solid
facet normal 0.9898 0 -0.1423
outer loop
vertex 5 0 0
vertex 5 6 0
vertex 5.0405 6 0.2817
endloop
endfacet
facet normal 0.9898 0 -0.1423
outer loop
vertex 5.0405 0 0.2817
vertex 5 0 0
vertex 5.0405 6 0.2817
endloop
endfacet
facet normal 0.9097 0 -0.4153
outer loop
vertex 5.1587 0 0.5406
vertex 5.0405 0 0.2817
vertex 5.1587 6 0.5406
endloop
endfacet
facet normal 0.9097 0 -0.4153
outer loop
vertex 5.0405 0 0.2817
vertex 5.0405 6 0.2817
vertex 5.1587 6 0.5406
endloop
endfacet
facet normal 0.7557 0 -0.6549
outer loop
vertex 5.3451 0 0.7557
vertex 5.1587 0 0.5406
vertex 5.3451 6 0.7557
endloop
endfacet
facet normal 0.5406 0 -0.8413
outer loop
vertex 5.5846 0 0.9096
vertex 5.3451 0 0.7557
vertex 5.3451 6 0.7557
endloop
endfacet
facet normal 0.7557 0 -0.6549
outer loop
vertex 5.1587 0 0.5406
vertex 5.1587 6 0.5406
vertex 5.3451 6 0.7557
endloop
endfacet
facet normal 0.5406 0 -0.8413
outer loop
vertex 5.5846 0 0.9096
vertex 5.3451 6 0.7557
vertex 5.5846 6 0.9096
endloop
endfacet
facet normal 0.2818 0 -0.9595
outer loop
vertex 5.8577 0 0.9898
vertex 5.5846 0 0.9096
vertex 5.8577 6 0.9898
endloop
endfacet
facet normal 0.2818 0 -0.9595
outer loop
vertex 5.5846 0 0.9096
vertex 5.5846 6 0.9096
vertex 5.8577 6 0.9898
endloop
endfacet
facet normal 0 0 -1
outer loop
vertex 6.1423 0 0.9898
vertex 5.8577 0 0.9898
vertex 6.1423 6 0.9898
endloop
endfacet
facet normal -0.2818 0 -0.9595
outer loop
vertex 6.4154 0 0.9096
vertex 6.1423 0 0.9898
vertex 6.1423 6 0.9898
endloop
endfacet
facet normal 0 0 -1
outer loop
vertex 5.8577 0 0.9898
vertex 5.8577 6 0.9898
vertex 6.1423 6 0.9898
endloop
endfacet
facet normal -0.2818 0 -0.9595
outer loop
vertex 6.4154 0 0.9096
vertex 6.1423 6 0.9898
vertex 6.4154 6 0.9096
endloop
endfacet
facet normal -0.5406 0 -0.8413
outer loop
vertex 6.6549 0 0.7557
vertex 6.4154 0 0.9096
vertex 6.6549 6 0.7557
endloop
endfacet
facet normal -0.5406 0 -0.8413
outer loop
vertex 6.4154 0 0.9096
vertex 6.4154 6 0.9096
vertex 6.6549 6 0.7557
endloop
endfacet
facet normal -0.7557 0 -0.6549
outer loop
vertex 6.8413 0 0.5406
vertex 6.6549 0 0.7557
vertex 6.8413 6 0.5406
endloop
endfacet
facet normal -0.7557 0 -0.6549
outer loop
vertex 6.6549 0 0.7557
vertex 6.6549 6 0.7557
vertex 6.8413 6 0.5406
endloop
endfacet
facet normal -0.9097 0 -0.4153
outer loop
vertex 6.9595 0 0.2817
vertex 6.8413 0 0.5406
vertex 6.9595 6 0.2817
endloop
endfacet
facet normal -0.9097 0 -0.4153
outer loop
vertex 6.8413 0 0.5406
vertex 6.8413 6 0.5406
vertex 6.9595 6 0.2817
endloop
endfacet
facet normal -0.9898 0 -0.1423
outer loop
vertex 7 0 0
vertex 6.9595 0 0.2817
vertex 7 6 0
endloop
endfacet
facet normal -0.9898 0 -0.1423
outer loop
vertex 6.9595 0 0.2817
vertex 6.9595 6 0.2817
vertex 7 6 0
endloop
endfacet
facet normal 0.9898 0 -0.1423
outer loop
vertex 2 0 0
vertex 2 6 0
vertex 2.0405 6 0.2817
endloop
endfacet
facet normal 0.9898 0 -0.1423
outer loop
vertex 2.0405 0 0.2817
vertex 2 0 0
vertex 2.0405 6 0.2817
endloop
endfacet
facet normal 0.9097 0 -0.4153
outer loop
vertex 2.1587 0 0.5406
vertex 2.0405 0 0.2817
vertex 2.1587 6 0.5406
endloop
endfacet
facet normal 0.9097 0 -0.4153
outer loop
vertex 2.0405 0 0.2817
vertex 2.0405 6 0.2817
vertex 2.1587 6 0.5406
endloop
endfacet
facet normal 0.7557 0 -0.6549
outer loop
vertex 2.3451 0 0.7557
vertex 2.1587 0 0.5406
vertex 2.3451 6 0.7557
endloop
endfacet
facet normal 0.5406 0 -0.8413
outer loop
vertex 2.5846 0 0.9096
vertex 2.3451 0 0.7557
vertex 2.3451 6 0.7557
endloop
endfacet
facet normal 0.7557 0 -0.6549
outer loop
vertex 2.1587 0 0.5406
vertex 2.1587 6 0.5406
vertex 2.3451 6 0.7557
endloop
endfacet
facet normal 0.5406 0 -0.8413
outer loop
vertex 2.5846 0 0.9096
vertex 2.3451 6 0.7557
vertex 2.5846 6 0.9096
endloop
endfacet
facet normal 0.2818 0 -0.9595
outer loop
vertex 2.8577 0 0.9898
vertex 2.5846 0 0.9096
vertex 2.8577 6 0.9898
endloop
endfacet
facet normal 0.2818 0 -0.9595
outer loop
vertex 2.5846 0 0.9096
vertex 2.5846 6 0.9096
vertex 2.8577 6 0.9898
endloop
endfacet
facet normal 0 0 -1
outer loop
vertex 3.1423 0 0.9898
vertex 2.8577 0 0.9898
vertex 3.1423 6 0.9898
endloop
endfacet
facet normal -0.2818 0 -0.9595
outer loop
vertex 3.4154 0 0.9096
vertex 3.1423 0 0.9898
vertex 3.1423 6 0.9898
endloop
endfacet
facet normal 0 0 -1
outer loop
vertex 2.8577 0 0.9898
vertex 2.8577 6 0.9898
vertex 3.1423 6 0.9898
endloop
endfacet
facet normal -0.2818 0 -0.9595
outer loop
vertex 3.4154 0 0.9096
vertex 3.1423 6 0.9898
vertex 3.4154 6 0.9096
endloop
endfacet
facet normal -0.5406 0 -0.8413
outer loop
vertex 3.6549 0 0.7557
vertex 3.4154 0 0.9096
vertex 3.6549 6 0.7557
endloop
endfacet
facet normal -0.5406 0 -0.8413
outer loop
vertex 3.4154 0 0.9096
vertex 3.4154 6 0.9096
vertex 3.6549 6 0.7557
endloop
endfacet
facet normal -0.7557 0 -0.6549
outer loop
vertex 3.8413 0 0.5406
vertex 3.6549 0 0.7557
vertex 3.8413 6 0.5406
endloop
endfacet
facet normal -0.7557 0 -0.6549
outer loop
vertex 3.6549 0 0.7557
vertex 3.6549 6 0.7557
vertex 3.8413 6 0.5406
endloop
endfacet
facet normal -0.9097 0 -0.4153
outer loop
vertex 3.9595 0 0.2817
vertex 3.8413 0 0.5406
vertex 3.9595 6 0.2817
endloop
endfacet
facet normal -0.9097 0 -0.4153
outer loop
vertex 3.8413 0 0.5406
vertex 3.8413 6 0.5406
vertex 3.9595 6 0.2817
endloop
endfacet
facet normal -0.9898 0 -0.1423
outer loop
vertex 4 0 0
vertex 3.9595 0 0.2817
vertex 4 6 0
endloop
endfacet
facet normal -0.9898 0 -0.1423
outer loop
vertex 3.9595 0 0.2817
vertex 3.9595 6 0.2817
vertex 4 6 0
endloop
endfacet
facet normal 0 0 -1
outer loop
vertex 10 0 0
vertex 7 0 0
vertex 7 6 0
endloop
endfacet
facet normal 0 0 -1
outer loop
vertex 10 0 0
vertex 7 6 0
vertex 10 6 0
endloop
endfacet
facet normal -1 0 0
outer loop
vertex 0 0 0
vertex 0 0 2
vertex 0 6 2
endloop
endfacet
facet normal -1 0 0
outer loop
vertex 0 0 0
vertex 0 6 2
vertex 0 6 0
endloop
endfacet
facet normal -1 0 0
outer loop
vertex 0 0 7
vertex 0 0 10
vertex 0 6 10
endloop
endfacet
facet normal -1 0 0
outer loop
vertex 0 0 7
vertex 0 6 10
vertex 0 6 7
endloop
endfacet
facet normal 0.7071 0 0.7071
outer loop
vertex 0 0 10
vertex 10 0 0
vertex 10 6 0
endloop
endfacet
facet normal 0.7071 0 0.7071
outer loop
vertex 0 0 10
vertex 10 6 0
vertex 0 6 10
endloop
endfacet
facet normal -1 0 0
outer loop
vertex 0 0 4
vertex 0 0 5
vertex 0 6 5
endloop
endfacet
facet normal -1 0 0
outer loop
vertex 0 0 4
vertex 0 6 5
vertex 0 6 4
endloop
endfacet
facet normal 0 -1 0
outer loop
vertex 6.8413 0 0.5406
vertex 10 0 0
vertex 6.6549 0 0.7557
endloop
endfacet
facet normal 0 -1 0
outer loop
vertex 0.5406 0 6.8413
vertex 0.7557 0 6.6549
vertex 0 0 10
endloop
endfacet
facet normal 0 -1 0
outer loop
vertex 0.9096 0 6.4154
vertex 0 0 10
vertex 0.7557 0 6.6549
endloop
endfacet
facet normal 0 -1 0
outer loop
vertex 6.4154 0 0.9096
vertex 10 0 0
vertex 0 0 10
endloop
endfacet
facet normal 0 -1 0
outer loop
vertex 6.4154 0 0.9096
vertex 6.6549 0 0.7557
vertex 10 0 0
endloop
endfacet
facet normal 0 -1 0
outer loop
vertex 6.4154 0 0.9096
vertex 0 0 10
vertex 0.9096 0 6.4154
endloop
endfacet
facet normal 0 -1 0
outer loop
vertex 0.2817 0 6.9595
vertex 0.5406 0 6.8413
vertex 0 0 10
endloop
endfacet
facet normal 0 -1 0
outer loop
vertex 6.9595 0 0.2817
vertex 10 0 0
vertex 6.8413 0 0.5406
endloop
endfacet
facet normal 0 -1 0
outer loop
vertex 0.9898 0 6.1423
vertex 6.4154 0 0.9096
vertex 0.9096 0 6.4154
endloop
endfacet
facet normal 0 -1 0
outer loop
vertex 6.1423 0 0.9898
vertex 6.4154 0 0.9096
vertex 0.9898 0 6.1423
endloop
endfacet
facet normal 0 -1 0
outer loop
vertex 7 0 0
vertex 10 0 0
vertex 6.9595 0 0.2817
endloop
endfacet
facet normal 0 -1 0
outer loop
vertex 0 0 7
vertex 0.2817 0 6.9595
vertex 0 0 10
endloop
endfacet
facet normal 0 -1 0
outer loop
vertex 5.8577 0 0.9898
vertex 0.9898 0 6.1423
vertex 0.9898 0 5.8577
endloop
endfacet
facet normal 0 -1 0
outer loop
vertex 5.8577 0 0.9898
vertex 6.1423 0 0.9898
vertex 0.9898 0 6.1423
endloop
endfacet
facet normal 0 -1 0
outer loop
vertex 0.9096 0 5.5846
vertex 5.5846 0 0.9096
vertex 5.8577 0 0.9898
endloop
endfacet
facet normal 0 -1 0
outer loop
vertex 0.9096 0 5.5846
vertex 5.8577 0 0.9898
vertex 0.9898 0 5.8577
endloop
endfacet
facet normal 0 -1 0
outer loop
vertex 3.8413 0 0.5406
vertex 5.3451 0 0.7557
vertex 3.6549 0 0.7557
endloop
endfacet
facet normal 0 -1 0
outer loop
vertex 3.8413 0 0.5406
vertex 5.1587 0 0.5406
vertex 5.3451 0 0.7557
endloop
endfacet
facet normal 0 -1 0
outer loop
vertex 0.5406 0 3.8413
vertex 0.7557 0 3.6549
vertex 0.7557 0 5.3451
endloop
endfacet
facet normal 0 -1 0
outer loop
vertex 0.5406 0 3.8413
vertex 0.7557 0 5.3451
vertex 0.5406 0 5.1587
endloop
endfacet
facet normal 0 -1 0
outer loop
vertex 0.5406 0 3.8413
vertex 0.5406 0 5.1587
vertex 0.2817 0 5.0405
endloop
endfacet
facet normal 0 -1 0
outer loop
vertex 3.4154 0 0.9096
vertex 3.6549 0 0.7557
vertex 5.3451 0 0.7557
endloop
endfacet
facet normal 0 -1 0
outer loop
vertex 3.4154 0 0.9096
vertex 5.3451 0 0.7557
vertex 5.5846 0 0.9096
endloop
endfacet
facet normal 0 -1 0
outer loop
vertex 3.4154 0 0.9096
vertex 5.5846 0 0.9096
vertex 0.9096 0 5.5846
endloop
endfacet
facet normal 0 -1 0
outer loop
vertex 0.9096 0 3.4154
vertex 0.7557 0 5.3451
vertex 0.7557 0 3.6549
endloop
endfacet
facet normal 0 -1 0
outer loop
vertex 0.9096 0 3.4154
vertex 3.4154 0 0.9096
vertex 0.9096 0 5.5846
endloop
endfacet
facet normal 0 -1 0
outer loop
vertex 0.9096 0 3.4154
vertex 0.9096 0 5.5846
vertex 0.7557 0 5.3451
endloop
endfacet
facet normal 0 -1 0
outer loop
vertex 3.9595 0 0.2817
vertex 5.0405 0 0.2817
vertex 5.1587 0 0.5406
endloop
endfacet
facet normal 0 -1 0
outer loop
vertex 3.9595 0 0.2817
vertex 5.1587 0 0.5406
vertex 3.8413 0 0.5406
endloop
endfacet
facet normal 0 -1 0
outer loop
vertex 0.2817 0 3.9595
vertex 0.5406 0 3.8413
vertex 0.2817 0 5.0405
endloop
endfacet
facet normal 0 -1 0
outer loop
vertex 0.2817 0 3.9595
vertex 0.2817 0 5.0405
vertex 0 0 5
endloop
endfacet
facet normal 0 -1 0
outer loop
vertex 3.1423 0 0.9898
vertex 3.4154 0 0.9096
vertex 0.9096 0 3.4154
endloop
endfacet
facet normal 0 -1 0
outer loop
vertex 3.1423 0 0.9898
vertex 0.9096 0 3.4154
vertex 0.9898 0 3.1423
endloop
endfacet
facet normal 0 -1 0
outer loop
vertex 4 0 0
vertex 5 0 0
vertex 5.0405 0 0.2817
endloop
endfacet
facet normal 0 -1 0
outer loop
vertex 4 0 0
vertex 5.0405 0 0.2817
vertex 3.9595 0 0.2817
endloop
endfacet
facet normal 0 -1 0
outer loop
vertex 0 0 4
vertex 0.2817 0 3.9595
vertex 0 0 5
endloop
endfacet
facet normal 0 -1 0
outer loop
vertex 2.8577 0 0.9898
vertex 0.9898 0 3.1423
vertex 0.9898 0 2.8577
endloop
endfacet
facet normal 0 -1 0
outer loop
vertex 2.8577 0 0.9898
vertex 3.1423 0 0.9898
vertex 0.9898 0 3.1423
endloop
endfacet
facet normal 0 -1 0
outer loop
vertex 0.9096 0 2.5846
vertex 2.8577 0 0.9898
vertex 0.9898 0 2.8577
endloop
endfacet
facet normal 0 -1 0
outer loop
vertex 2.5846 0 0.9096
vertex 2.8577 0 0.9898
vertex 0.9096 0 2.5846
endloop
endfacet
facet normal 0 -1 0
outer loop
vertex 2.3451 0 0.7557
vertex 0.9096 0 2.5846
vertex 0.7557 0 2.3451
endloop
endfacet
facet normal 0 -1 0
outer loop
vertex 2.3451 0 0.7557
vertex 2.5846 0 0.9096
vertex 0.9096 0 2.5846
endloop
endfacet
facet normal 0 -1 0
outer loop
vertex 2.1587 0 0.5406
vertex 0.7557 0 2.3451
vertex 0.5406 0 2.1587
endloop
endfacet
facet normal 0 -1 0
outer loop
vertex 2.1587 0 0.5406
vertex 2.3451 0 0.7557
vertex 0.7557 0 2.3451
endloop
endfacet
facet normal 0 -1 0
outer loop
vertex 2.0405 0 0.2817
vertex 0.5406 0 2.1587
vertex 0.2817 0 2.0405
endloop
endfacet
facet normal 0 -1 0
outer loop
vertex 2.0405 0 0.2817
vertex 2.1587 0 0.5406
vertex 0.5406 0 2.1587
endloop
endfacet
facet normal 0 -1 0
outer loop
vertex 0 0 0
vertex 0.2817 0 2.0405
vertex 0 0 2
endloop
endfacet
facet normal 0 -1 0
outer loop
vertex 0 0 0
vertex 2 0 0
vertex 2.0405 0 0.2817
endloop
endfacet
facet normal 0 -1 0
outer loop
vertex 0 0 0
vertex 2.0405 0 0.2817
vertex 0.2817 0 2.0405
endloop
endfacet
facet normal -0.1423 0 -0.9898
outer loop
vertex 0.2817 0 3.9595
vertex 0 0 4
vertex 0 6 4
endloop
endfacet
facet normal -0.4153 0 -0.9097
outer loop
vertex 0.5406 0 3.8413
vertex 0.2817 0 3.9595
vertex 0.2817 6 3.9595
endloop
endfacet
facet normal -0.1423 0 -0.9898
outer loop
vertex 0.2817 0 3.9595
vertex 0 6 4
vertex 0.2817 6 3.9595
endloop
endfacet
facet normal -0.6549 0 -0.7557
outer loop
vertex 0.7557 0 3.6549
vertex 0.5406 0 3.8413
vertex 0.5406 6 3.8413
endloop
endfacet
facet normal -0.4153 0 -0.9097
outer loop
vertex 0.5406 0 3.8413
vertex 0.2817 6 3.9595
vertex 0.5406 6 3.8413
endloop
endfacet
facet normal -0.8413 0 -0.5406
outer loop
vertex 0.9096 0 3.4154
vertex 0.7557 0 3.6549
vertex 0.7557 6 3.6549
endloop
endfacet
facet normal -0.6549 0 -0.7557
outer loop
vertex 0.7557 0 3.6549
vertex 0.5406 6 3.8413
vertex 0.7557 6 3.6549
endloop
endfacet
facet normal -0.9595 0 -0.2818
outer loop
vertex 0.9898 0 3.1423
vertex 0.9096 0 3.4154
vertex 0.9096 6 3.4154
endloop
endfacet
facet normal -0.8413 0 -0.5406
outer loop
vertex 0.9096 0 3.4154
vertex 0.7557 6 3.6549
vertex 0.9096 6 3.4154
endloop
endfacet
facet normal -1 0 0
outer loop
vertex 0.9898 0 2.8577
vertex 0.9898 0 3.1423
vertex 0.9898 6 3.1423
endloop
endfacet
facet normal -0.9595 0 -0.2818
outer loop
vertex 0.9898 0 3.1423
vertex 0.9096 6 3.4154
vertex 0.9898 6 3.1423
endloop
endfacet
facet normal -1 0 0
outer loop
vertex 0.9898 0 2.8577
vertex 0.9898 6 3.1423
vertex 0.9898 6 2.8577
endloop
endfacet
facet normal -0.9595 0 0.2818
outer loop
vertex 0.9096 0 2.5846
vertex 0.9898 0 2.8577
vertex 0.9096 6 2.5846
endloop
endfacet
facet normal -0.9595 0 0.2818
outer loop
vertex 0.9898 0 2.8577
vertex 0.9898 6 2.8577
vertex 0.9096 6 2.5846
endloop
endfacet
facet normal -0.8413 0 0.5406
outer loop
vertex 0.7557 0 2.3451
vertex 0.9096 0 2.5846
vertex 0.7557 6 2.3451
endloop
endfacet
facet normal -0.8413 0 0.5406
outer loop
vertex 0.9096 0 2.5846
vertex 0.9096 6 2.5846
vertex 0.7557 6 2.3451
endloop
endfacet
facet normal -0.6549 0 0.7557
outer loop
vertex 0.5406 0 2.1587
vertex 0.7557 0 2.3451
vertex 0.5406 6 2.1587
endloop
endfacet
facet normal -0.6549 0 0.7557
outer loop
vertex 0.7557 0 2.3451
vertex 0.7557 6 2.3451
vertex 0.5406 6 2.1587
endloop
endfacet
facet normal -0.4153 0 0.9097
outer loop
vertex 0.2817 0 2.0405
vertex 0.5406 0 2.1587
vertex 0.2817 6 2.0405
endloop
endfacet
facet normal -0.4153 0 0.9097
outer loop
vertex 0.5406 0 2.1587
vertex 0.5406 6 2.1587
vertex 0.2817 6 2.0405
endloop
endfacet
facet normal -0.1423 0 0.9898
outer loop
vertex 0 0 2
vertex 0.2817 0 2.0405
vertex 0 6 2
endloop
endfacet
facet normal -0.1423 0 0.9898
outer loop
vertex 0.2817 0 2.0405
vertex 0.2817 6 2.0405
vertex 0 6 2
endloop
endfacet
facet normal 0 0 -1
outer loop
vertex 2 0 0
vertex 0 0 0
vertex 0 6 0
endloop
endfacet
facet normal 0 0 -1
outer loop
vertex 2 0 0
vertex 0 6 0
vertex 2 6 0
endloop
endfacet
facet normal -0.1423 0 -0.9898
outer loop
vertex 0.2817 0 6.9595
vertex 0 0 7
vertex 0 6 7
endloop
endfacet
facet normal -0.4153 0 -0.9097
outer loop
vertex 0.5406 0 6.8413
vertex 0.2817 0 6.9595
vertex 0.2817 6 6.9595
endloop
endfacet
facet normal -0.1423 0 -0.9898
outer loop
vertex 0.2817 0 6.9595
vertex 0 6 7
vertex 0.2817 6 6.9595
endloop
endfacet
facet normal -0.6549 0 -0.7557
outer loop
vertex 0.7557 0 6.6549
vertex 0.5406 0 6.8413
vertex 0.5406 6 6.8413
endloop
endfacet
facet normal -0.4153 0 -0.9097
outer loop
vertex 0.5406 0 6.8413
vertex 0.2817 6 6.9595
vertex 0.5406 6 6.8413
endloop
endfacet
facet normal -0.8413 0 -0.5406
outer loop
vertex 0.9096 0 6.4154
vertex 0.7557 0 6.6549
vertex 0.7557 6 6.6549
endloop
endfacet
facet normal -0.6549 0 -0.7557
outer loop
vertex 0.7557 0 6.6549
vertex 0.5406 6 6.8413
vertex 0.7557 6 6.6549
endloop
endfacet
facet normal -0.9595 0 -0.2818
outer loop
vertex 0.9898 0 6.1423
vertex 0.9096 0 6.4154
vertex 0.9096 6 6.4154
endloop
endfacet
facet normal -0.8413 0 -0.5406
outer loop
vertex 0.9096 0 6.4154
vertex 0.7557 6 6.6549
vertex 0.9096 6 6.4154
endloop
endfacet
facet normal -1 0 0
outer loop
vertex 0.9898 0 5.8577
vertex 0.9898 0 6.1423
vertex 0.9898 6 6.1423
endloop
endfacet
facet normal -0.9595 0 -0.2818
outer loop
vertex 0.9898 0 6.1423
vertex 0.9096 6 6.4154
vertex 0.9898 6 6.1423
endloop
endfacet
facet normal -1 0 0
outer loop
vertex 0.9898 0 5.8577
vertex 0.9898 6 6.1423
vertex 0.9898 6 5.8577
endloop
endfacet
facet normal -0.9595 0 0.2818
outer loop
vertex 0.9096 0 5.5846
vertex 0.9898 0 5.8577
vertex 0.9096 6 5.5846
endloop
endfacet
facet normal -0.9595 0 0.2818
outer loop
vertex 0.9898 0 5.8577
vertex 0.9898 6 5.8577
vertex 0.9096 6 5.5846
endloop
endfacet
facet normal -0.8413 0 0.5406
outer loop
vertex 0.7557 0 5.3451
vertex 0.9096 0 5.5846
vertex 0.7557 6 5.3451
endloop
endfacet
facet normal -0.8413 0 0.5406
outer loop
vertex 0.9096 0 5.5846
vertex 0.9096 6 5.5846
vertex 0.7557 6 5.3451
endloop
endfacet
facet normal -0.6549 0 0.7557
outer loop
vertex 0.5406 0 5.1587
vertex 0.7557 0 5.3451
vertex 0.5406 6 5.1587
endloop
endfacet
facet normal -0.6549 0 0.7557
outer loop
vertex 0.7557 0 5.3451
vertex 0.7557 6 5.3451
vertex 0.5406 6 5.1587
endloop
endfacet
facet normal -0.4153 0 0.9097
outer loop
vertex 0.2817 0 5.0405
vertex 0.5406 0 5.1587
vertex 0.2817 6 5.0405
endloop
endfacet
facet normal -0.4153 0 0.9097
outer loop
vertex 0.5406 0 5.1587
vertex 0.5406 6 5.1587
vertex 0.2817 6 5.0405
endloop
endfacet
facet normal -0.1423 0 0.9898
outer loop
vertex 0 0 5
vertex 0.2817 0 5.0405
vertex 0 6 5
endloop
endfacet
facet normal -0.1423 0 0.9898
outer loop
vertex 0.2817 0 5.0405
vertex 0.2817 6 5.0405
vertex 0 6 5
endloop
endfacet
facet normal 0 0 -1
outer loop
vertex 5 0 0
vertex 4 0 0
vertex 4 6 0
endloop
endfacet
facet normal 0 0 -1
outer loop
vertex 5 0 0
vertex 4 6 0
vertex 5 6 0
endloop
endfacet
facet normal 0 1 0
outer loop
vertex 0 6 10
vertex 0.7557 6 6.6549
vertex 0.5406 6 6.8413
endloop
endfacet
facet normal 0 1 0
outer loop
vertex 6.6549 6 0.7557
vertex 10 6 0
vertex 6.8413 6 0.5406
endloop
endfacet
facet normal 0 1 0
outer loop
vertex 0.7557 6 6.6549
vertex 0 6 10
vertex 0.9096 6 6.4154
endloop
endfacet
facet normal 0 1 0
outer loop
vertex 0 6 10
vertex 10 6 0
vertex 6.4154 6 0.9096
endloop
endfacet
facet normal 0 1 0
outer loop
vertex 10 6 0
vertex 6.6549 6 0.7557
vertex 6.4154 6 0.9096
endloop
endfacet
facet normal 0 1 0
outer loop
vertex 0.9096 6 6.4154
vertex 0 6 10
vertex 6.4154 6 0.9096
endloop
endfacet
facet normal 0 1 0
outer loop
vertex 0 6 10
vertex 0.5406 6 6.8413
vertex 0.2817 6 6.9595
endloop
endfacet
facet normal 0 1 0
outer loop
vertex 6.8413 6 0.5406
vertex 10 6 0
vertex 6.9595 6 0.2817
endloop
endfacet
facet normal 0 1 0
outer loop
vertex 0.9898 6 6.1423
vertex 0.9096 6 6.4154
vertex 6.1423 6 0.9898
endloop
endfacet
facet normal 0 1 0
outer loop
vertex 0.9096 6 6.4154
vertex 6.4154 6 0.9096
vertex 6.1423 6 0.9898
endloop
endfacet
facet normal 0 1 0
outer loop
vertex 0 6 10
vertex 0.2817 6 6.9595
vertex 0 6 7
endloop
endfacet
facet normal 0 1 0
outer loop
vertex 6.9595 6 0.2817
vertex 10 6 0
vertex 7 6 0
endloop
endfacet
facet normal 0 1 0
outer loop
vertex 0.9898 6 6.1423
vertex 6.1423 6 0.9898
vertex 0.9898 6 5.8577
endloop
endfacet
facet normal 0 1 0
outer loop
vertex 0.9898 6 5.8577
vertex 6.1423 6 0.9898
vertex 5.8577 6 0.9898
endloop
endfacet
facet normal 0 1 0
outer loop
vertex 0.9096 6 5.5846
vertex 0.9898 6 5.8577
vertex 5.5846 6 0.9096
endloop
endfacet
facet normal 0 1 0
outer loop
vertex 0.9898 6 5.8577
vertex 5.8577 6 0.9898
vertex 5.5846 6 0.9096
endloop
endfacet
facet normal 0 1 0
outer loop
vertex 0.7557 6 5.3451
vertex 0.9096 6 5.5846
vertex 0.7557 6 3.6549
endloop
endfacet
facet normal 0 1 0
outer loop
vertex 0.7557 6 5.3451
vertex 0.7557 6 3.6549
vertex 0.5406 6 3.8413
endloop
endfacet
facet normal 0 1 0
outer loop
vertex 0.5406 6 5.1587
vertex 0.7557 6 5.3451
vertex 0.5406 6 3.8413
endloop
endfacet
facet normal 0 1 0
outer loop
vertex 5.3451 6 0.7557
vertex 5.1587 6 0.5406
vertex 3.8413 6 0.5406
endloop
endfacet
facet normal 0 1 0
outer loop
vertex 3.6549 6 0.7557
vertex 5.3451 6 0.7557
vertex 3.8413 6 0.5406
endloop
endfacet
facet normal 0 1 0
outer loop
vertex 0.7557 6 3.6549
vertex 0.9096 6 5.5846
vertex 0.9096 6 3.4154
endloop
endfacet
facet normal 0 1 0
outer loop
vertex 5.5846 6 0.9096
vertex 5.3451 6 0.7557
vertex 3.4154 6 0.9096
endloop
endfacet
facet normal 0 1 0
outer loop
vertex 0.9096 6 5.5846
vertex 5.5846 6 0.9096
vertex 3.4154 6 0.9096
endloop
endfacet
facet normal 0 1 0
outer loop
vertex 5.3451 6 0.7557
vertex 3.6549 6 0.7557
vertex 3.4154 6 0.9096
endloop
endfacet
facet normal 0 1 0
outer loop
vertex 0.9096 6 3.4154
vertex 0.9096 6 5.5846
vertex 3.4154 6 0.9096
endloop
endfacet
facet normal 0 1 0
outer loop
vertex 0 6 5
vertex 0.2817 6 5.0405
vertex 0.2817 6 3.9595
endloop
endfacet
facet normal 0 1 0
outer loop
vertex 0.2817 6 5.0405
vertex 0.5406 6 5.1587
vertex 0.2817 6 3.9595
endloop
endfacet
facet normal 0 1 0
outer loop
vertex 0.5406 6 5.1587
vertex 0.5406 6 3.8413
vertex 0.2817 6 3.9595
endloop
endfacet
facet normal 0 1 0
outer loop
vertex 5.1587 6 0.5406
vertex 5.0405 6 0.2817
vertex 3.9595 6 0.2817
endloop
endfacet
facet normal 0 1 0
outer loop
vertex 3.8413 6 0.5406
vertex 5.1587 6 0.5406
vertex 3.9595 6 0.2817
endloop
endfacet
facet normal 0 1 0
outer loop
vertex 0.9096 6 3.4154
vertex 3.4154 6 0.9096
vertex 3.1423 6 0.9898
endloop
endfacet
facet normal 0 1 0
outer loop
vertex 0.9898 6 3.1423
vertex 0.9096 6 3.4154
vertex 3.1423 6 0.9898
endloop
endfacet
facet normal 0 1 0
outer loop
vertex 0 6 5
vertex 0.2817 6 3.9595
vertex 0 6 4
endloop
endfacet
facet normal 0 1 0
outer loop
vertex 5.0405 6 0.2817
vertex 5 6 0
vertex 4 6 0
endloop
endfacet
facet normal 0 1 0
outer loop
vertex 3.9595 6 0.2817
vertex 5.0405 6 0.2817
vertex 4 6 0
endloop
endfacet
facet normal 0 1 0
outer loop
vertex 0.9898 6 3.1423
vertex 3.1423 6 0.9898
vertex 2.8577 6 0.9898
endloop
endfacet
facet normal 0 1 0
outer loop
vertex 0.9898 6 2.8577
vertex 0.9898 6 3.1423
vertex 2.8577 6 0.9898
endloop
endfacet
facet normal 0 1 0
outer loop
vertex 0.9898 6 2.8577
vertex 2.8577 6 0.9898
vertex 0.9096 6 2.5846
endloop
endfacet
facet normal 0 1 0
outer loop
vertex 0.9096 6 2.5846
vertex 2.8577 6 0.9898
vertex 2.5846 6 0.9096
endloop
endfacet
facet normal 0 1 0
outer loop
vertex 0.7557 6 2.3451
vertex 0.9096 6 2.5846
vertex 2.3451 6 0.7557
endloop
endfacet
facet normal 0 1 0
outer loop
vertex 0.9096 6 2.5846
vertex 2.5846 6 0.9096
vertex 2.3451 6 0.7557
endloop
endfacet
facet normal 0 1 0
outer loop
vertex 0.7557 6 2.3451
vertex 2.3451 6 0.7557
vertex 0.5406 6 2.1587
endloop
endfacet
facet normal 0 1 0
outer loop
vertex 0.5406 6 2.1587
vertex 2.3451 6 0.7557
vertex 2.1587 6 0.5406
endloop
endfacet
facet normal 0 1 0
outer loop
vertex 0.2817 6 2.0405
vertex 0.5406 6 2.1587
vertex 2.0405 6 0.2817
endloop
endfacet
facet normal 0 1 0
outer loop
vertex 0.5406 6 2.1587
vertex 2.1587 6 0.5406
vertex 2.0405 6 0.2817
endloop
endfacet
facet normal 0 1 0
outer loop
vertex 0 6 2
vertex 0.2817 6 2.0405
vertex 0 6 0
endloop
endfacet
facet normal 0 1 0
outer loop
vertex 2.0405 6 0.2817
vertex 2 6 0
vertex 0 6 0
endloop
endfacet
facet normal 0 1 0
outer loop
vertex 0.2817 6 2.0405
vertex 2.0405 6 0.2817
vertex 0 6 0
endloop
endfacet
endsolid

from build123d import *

# Parameters (mm, degrees)
BOSS_EXTRUDE1_DEPTH = 6
SKETCH2_R           = 1
CUT_EXTRUDE1_DEPTH  = 16.362291496


with BuildPart() as part:
    # Sketch1 → Boss-Extrude1 (new body)
    with BuildSketch(Plane(origin=(0, 0, 0), x_dir=(1, 0, 0), z_dir=(0, 1, 0))):
        Polygon((0, 0), (10, 0), (0, -10), align=None)
    extrude(amount=BOSS_EXTRUDE1_DEPTH)

    # Sketch2 → Cut-Extrude1 (cut, through all)
    with BuildSketch(Plane(origin=(0, 6, 0), x_dir=(1, 0, 0), z_dir=(0, 1, 0))):
        with Locations((0, -6)):
            Circle(SKETCH2_R)
        with Locations((0, -3)):
            Circle(SKETCH2_R)
        with Locations((3, 0)):
            Circle(SKETCH2_R)
        with Locations((6, 0)):
            Circle(SKETCH2_R)
    extrude(amount=-CUT_EXTRUDE1_DEPTH, mode=Mode.SUBTRACT)


solid = part.part
